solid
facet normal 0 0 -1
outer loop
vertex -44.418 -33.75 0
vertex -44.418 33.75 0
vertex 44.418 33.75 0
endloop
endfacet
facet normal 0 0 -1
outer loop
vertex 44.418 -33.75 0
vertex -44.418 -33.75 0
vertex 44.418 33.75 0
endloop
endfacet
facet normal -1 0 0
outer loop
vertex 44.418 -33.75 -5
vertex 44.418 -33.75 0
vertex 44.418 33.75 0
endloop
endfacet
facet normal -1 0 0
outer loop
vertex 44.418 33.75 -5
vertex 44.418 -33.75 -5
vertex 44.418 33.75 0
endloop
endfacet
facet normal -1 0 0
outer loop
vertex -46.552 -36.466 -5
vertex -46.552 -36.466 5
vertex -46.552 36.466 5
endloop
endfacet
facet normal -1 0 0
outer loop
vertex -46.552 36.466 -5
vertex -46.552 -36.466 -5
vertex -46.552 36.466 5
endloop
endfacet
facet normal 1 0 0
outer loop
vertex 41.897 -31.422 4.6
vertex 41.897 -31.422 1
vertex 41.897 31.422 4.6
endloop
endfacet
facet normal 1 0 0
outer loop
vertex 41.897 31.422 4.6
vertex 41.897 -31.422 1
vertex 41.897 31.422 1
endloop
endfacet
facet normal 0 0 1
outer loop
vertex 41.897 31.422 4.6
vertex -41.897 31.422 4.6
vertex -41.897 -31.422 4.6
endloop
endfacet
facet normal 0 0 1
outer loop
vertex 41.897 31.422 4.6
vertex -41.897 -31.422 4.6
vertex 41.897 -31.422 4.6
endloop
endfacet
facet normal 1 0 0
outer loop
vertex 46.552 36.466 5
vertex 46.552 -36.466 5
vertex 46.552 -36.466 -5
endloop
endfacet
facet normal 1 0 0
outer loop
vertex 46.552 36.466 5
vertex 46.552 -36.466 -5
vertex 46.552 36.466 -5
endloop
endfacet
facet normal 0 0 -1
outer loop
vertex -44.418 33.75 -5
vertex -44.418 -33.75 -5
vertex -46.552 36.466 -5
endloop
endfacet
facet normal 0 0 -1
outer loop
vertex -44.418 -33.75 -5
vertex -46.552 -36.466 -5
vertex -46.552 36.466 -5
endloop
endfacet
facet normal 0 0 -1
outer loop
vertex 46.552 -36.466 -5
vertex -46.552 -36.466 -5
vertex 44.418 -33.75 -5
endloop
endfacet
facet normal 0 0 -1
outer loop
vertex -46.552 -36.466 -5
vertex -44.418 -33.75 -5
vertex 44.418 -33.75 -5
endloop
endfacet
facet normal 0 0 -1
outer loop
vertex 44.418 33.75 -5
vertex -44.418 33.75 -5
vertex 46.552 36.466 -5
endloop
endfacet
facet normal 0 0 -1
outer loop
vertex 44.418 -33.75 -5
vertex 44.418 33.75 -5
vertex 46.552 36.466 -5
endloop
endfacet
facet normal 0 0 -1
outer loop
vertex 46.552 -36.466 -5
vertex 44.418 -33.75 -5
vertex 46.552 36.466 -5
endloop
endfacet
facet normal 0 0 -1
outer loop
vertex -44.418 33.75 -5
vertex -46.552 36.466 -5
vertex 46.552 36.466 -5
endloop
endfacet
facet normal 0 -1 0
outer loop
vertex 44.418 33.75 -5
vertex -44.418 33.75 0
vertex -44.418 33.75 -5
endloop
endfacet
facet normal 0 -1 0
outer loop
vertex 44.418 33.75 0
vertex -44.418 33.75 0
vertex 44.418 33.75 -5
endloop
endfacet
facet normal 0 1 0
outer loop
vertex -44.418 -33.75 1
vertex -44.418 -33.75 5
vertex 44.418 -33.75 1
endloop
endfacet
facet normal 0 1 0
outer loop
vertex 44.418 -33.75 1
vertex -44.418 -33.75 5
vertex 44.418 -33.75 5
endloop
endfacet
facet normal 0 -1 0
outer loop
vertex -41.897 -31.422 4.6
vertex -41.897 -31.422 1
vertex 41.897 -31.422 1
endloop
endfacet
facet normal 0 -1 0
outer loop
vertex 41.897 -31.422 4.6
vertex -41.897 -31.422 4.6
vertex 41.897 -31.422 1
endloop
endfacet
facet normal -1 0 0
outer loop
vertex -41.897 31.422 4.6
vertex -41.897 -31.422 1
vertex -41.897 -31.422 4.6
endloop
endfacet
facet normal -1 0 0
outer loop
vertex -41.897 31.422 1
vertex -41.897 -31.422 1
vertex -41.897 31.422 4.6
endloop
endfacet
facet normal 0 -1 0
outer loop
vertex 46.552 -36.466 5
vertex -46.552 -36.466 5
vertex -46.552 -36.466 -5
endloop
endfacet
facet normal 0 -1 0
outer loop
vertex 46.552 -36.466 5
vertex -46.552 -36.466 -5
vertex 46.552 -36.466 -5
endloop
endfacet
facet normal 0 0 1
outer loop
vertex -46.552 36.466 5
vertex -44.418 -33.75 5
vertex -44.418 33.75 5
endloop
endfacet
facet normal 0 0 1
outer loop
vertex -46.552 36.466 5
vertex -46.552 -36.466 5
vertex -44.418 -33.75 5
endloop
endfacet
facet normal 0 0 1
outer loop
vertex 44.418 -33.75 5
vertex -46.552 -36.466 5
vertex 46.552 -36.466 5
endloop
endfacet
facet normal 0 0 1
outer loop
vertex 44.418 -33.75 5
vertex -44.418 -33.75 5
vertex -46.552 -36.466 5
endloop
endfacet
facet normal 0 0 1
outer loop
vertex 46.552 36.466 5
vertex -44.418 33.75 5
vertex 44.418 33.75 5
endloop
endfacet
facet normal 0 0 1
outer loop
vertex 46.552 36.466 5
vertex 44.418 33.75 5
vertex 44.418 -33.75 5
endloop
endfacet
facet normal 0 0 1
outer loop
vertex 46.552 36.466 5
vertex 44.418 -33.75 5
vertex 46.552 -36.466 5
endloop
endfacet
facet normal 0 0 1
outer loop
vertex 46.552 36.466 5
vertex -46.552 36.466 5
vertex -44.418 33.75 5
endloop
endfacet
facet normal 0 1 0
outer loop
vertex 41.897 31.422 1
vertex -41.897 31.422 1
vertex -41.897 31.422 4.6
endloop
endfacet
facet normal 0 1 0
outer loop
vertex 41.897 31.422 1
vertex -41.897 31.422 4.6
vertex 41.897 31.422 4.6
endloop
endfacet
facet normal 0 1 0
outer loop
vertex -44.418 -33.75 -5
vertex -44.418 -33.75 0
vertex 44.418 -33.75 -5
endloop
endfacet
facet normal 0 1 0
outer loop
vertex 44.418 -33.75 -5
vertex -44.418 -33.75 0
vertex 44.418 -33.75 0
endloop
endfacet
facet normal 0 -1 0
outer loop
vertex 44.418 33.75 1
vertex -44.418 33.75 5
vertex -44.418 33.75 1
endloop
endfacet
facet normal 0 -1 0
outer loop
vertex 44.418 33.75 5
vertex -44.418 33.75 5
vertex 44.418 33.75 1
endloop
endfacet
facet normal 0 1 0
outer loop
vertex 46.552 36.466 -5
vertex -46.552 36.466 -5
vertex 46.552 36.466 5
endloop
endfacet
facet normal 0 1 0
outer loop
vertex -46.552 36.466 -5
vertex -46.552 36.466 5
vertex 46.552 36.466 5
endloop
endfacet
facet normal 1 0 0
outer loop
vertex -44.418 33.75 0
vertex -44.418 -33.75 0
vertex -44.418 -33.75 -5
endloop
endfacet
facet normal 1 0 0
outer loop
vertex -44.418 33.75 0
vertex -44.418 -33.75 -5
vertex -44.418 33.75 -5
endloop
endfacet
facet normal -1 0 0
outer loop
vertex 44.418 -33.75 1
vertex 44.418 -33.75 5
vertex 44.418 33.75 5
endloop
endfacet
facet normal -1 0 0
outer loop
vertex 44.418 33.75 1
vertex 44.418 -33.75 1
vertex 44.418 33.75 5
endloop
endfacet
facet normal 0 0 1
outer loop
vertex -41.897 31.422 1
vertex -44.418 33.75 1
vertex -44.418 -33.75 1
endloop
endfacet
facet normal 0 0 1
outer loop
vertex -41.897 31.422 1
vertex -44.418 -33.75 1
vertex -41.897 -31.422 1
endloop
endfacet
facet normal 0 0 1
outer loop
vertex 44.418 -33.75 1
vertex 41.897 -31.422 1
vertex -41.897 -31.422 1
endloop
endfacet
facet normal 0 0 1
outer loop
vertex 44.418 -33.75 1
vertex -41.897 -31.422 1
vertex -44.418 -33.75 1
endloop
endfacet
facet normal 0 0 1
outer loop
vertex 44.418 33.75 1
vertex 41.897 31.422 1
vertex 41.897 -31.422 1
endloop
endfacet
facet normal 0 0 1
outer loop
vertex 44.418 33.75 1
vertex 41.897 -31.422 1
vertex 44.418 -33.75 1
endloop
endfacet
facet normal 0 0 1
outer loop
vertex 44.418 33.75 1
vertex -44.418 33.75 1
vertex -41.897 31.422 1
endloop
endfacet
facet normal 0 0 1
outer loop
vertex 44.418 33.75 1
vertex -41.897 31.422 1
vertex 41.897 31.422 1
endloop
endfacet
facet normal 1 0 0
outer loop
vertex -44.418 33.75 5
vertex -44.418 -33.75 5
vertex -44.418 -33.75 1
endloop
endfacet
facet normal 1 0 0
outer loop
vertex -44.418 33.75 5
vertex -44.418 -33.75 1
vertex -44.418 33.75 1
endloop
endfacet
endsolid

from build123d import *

# Parameters (mm, degrees)
F0_W     = 93.103454
F0_H     = 72.931036
F0_W_2   = 88.836216
F0_H_2   = 67.500002
F1_DEPTH = 5
F0_W_3   = 83.793112
F0_H_3   = 62.844828
F2_DEPTH = 1
F3_DEPTH = 4.6


with BuildPart() as f1:
    # F0 (on Top) → F1 (new body, symmetric)
    with BuildSketch(Plane.XY):
        Rectangle(F0_W, F0_H)
        Rectangle(F0_W_2, F0_H_2, mode=Mode.SUBTRACT)
    extrude(amount=F1_DEPTH, both=True)

    # F0 (on Top) → F2 (join)
    with BuildSketch(Plane.XY):
        Rectangle(F0_W_2, F0_H_2)
        Rectangle(F0_W_3, F0_H_3, mode=Mode.SUBTRACT)
    extrude(amount=F2_DEPTH)

    # F0 (on Top) → F3 (join)
    with BuildSketch(Plane.XY):
        Rectangle(F0_W_3, F0_H_3)
    extrude(amount=F3_DEPTH)


solid = f1.part
